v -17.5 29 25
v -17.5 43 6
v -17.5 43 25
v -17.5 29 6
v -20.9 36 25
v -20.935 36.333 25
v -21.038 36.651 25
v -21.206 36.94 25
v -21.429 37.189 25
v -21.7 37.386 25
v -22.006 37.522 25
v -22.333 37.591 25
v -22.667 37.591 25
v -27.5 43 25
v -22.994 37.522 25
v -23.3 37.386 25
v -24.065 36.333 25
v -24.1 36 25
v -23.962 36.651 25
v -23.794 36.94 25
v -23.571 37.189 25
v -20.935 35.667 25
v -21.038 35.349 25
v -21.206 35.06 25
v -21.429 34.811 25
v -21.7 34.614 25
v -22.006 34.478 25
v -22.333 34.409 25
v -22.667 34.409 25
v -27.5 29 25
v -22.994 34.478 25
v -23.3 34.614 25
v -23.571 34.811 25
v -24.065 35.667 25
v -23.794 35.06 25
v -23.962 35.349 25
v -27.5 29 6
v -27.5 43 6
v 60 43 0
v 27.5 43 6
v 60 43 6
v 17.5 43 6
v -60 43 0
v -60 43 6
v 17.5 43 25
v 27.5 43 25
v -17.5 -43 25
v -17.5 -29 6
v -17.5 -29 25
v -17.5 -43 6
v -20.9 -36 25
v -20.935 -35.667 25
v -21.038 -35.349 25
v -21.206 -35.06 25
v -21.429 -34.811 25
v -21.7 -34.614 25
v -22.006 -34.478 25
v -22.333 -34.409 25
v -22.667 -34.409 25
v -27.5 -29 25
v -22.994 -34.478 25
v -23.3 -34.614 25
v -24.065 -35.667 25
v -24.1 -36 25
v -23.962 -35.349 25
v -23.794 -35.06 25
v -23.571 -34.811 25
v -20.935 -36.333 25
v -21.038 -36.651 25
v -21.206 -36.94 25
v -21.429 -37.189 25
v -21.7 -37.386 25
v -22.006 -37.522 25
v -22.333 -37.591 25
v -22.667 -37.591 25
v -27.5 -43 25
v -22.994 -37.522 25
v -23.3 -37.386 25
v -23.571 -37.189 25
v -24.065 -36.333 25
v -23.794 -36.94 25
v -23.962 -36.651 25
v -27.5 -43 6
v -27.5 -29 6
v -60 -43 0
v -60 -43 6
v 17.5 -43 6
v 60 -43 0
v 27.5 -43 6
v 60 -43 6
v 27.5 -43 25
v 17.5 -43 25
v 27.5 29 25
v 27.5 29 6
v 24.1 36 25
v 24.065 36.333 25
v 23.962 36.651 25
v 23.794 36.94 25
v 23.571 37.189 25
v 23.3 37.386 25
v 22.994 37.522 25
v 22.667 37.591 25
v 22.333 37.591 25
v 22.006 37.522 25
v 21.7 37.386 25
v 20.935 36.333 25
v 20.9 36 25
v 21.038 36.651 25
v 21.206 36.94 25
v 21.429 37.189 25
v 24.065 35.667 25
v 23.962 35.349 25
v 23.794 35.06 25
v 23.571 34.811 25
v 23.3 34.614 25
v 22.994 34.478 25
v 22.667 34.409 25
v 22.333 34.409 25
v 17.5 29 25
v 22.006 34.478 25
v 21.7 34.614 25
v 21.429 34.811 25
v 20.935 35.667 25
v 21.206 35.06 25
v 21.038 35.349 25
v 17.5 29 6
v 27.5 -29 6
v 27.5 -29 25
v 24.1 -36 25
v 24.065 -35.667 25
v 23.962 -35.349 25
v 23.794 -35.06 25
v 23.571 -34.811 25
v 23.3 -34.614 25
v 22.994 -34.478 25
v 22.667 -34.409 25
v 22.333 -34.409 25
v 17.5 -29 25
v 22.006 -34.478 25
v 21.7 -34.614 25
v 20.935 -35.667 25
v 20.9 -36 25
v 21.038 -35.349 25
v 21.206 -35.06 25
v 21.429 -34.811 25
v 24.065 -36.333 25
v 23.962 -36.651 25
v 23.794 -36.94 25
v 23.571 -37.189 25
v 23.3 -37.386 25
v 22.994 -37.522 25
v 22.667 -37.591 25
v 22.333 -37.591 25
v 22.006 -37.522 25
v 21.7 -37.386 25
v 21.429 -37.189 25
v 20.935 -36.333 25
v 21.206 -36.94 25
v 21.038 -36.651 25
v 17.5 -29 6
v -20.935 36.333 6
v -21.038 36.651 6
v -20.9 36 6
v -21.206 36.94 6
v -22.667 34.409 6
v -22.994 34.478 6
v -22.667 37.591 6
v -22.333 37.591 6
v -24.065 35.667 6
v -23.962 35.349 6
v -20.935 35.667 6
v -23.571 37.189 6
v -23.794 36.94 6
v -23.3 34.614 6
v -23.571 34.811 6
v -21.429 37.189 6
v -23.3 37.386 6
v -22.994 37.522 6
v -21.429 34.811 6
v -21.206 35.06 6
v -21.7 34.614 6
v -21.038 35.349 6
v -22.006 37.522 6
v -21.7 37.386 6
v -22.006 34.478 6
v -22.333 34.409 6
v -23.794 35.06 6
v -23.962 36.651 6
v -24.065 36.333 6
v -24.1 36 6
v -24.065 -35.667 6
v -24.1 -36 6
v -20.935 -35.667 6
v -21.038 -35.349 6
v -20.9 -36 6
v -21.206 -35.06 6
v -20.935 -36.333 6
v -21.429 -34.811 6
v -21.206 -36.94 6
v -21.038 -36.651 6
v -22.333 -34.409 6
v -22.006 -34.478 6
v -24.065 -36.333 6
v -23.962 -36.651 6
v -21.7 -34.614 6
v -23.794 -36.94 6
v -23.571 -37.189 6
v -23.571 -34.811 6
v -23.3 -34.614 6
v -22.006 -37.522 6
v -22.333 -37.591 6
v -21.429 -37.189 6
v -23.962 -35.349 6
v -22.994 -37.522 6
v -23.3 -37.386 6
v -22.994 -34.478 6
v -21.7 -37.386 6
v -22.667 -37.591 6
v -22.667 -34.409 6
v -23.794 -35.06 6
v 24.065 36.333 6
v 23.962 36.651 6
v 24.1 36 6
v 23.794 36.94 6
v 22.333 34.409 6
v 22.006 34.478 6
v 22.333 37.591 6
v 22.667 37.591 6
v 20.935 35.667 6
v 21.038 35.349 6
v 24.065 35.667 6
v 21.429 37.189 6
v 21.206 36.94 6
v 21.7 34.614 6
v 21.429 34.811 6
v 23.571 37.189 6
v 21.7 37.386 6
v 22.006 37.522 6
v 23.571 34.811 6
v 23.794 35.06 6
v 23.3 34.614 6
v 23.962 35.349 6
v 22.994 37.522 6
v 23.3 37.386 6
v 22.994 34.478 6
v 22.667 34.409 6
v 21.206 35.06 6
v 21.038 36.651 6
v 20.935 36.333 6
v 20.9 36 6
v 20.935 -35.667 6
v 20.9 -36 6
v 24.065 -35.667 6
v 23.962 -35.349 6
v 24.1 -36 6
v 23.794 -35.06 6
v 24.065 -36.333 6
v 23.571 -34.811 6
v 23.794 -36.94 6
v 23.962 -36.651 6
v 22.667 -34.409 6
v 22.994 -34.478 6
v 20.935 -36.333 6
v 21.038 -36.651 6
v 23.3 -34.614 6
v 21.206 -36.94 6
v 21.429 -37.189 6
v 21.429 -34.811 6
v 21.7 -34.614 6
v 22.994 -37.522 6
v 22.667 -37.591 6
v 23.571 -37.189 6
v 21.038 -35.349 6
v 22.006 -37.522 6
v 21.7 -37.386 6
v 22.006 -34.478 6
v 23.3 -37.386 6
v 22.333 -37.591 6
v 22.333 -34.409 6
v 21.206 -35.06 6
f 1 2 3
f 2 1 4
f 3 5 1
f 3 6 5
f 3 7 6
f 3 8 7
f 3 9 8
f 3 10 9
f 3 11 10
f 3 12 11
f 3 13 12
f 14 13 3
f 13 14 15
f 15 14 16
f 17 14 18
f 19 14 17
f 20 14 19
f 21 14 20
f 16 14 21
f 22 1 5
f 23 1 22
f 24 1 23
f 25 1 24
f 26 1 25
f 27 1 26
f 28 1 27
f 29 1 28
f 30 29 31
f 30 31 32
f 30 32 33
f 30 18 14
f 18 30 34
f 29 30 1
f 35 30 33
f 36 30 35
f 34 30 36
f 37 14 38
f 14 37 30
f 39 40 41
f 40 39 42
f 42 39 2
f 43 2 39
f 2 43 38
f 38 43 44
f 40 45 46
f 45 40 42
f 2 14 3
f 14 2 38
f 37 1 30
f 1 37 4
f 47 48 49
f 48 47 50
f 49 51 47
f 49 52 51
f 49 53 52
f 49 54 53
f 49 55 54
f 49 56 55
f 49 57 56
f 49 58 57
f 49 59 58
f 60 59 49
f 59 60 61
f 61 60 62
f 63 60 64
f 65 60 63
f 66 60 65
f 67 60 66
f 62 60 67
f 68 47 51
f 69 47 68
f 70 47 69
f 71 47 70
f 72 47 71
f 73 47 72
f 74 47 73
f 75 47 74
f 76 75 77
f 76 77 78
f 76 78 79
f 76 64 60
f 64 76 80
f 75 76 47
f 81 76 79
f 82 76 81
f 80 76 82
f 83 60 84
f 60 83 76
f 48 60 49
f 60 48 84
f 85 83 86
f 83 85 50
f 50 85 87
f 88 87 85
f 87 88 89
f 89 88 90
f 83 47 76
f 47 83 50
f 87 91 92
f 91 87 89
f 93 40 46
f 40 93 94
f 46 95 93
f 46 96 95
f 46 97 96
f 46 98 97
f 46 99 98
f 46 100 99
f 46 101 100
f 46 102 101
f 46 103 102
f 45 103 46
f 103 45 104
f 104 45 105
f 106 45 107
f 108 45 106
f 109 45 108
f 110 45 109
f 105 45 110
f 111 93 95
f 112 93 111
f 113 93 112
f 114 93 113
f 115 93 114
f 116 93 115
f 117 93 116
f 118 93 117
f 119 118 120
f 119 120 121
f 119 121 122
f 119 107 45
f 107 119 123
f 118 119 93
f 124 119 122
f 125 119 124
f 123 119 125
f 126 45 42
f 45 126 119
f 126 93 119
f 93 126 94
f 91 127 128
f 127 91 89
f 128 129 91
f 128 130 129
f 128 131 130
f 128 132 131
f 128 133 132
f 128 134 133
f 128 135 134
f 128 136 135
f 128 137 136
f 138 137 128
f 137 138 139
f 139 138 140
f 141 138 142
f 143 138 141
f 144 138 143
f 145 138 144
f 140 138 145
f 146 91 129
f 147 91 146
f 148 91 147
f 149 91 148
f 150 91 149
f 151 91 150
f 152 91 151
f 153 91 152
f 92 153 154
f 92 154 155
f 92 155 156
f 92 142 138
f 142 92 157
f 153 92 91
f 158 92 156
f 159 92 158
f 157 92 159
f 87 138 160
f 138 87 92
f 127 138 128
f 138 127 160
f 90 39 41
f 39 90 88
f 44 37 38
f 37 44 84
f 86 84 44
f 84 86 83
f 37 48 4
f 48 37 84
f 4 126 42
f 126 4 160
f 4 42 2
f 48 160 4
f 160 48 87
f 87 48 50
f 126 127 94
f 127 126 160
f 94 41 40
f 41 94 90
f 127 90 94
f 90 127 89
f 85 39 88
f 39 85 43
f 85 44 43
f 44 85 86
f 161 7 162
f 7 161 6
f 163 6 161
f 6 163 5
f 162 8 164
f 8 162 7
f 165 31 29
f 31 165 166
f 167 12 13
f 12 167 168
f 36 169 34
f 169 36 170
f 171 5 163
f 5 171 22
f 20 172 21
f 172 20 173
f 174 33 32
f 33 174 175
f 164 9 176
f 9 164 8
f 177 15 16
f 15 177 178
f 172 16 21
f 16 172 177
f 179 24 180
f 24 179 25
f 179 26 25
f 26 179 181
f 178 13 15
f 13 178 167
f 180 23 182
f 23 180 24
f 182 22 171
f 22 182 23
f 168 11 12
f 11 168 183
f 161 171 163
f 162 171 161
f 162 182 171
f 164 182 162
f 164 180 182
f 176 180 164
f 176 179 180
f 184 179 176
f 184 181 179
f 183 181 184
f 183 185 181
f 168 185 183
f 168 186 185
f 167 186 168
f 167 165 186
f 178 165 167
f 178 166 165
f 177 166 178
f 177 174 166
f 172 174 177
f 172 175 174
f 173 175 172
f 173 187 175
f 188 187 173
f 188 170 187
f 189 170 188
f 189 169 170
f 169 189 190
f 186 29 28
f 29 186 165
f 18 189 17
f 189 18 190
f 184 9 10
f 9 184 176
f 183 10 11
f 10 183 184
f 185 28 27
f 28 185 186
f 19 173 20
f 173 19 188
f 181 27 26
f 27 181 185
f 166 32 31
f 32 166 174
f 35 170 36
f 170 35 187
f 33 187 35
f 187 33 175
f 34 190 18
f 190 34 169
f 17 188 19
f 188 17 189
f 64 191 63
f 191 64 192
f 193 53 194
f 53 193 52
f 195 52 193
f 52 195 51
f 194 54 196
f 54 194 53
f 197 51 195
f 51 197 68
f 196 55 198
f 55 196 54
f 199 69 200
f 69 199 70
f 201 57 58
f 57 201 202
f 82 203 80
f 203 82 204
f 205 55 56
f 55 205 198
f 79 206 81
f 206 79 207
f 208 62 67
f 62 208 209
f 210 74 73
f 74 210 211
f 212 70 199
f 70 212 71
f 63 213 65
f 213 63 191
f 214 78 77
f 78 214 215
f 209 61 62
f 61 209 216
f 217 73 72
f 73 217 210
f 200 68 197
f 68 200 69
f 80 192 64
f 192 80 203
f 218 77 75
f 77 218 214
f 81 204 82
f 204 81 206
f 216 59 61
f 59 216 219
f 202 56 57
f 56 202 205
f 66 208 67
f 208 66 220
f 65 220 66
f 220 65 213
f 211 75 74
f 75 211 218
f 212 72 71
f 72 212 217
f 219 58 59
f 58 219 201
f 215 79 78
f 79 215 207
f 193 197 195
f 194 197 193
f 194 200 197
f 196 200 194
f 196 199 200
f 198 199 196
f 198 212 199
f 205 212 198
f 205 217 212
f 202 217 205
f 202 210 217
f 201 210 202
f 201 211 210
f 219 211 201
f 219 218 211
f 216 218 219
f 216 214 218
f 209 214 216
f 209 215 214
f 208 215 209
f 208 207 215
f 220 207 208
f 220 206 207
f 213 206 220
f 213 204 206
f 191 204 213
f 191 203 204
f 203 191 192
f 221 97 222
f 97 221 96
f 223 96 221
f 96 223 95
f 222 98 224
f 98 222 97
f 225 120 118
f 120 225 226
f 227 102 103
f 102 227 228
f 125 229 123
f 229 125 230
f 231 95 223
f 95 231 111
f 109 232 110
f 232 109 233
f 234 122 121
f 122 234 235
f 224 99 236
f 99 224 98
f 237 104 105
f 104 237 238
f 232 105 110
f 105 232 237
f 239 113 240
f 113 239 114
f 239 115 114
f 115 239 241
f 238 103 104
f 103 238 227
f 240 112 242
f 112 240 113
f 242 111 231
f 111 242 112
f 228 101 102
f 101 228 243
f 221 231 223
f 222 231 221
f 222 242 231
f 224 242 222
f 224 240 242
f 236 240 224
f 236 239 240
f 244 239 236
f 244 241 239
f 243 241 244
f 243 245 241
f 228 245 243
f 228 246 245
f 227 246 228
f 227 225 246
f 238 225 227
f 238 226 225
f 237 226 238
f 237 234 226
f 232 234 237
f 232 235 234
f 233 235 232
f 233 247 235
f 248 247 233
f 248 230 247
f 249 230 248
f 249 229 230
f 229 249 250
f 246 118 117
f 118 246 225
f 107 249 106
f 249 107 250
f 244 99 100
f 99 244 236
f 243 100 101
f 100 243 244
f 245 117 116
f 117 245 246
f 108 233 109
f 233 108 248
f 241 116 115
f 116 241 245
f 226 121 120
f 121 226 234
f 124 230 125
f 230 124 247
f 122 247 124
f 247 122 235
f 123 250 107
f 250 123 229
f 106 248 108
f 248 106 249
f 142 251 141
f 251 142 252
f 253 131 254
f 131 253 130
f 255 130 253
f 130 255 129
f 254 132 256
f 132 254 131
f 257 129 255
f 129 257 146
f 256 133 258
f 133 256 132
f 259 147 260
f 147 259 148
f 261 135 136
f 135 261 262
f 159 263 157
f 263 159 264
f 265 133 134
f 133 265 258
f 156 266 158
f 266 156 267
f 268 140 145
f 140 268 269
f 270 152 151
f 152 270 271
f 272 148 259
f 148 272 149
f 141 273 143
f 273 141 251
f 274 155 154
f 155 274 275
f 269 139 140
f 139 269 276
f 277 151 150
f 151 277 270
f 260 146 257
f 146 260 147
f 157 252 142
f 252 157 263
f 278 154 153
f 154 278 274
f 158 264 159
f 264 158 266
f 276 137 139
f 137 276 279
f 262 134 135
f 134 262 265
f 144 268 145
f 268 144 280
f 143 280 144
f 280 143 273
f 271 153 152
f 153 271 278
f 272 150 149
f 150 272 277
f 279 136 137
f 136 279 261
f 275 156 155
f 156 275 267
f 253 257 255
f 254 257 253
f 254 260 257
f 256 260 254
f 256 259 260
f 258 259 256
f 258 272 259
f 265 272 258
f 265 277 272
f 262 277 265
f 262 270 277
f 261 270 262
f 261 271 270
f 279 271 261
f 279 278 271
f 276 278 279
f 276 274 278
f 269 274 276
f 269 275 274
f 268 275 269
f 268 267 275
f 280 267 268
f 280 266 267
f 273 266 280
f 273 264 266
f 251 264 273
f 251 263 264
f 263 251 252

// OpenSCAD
//ReaderUndertray.scad (c) by Embecosm Ltd
//
//ReaderUndertray.scad is licensed under a
//Creative Commons Attribution-ShareAlike 4.0 International License.
//
//You should have received a copy of the license along with this
//work. If not, see <http://creativecommons.org/licenses/by-sa/4.0/>.

difference(){
    union(){
        translate([0,0,3])
            cube([120,86,6],center=true);
        translate([-22.5,0,0]){
            union(){
                translate([0,36,15])
                        cube([10,14,20], center=true);
                translate([0,-36,15])
                        cube([10,14,20], center=true);
            };
        };
        translate([22.5,0,0]){
            union(){
                translate([0,36,15])
                        cube([10,14,20], center=true);
                translate([0,-36,15])
                        cube([10,14,20], center=true);
            };
        };
    };
    translate([-22.5,0,16]){
        union(){
            translate([0,36,0])
                    cylinder(r=1.6, h=20, center=true, $fn=30);
            translate([0,-36,0])
                    cylinder(r=1.6, h=20, center=true, $fn=30);
        };
    };
    translate([22.5,0,16]){
        union(){
            translate([0,36,0])
                    cylinder(r=1.6, h=20, center=true, $fn=30);
            translate([0,-36,0])
                    cylinder(r=1.6, h=20, center=true, $fn=30);
        };
    };
};
